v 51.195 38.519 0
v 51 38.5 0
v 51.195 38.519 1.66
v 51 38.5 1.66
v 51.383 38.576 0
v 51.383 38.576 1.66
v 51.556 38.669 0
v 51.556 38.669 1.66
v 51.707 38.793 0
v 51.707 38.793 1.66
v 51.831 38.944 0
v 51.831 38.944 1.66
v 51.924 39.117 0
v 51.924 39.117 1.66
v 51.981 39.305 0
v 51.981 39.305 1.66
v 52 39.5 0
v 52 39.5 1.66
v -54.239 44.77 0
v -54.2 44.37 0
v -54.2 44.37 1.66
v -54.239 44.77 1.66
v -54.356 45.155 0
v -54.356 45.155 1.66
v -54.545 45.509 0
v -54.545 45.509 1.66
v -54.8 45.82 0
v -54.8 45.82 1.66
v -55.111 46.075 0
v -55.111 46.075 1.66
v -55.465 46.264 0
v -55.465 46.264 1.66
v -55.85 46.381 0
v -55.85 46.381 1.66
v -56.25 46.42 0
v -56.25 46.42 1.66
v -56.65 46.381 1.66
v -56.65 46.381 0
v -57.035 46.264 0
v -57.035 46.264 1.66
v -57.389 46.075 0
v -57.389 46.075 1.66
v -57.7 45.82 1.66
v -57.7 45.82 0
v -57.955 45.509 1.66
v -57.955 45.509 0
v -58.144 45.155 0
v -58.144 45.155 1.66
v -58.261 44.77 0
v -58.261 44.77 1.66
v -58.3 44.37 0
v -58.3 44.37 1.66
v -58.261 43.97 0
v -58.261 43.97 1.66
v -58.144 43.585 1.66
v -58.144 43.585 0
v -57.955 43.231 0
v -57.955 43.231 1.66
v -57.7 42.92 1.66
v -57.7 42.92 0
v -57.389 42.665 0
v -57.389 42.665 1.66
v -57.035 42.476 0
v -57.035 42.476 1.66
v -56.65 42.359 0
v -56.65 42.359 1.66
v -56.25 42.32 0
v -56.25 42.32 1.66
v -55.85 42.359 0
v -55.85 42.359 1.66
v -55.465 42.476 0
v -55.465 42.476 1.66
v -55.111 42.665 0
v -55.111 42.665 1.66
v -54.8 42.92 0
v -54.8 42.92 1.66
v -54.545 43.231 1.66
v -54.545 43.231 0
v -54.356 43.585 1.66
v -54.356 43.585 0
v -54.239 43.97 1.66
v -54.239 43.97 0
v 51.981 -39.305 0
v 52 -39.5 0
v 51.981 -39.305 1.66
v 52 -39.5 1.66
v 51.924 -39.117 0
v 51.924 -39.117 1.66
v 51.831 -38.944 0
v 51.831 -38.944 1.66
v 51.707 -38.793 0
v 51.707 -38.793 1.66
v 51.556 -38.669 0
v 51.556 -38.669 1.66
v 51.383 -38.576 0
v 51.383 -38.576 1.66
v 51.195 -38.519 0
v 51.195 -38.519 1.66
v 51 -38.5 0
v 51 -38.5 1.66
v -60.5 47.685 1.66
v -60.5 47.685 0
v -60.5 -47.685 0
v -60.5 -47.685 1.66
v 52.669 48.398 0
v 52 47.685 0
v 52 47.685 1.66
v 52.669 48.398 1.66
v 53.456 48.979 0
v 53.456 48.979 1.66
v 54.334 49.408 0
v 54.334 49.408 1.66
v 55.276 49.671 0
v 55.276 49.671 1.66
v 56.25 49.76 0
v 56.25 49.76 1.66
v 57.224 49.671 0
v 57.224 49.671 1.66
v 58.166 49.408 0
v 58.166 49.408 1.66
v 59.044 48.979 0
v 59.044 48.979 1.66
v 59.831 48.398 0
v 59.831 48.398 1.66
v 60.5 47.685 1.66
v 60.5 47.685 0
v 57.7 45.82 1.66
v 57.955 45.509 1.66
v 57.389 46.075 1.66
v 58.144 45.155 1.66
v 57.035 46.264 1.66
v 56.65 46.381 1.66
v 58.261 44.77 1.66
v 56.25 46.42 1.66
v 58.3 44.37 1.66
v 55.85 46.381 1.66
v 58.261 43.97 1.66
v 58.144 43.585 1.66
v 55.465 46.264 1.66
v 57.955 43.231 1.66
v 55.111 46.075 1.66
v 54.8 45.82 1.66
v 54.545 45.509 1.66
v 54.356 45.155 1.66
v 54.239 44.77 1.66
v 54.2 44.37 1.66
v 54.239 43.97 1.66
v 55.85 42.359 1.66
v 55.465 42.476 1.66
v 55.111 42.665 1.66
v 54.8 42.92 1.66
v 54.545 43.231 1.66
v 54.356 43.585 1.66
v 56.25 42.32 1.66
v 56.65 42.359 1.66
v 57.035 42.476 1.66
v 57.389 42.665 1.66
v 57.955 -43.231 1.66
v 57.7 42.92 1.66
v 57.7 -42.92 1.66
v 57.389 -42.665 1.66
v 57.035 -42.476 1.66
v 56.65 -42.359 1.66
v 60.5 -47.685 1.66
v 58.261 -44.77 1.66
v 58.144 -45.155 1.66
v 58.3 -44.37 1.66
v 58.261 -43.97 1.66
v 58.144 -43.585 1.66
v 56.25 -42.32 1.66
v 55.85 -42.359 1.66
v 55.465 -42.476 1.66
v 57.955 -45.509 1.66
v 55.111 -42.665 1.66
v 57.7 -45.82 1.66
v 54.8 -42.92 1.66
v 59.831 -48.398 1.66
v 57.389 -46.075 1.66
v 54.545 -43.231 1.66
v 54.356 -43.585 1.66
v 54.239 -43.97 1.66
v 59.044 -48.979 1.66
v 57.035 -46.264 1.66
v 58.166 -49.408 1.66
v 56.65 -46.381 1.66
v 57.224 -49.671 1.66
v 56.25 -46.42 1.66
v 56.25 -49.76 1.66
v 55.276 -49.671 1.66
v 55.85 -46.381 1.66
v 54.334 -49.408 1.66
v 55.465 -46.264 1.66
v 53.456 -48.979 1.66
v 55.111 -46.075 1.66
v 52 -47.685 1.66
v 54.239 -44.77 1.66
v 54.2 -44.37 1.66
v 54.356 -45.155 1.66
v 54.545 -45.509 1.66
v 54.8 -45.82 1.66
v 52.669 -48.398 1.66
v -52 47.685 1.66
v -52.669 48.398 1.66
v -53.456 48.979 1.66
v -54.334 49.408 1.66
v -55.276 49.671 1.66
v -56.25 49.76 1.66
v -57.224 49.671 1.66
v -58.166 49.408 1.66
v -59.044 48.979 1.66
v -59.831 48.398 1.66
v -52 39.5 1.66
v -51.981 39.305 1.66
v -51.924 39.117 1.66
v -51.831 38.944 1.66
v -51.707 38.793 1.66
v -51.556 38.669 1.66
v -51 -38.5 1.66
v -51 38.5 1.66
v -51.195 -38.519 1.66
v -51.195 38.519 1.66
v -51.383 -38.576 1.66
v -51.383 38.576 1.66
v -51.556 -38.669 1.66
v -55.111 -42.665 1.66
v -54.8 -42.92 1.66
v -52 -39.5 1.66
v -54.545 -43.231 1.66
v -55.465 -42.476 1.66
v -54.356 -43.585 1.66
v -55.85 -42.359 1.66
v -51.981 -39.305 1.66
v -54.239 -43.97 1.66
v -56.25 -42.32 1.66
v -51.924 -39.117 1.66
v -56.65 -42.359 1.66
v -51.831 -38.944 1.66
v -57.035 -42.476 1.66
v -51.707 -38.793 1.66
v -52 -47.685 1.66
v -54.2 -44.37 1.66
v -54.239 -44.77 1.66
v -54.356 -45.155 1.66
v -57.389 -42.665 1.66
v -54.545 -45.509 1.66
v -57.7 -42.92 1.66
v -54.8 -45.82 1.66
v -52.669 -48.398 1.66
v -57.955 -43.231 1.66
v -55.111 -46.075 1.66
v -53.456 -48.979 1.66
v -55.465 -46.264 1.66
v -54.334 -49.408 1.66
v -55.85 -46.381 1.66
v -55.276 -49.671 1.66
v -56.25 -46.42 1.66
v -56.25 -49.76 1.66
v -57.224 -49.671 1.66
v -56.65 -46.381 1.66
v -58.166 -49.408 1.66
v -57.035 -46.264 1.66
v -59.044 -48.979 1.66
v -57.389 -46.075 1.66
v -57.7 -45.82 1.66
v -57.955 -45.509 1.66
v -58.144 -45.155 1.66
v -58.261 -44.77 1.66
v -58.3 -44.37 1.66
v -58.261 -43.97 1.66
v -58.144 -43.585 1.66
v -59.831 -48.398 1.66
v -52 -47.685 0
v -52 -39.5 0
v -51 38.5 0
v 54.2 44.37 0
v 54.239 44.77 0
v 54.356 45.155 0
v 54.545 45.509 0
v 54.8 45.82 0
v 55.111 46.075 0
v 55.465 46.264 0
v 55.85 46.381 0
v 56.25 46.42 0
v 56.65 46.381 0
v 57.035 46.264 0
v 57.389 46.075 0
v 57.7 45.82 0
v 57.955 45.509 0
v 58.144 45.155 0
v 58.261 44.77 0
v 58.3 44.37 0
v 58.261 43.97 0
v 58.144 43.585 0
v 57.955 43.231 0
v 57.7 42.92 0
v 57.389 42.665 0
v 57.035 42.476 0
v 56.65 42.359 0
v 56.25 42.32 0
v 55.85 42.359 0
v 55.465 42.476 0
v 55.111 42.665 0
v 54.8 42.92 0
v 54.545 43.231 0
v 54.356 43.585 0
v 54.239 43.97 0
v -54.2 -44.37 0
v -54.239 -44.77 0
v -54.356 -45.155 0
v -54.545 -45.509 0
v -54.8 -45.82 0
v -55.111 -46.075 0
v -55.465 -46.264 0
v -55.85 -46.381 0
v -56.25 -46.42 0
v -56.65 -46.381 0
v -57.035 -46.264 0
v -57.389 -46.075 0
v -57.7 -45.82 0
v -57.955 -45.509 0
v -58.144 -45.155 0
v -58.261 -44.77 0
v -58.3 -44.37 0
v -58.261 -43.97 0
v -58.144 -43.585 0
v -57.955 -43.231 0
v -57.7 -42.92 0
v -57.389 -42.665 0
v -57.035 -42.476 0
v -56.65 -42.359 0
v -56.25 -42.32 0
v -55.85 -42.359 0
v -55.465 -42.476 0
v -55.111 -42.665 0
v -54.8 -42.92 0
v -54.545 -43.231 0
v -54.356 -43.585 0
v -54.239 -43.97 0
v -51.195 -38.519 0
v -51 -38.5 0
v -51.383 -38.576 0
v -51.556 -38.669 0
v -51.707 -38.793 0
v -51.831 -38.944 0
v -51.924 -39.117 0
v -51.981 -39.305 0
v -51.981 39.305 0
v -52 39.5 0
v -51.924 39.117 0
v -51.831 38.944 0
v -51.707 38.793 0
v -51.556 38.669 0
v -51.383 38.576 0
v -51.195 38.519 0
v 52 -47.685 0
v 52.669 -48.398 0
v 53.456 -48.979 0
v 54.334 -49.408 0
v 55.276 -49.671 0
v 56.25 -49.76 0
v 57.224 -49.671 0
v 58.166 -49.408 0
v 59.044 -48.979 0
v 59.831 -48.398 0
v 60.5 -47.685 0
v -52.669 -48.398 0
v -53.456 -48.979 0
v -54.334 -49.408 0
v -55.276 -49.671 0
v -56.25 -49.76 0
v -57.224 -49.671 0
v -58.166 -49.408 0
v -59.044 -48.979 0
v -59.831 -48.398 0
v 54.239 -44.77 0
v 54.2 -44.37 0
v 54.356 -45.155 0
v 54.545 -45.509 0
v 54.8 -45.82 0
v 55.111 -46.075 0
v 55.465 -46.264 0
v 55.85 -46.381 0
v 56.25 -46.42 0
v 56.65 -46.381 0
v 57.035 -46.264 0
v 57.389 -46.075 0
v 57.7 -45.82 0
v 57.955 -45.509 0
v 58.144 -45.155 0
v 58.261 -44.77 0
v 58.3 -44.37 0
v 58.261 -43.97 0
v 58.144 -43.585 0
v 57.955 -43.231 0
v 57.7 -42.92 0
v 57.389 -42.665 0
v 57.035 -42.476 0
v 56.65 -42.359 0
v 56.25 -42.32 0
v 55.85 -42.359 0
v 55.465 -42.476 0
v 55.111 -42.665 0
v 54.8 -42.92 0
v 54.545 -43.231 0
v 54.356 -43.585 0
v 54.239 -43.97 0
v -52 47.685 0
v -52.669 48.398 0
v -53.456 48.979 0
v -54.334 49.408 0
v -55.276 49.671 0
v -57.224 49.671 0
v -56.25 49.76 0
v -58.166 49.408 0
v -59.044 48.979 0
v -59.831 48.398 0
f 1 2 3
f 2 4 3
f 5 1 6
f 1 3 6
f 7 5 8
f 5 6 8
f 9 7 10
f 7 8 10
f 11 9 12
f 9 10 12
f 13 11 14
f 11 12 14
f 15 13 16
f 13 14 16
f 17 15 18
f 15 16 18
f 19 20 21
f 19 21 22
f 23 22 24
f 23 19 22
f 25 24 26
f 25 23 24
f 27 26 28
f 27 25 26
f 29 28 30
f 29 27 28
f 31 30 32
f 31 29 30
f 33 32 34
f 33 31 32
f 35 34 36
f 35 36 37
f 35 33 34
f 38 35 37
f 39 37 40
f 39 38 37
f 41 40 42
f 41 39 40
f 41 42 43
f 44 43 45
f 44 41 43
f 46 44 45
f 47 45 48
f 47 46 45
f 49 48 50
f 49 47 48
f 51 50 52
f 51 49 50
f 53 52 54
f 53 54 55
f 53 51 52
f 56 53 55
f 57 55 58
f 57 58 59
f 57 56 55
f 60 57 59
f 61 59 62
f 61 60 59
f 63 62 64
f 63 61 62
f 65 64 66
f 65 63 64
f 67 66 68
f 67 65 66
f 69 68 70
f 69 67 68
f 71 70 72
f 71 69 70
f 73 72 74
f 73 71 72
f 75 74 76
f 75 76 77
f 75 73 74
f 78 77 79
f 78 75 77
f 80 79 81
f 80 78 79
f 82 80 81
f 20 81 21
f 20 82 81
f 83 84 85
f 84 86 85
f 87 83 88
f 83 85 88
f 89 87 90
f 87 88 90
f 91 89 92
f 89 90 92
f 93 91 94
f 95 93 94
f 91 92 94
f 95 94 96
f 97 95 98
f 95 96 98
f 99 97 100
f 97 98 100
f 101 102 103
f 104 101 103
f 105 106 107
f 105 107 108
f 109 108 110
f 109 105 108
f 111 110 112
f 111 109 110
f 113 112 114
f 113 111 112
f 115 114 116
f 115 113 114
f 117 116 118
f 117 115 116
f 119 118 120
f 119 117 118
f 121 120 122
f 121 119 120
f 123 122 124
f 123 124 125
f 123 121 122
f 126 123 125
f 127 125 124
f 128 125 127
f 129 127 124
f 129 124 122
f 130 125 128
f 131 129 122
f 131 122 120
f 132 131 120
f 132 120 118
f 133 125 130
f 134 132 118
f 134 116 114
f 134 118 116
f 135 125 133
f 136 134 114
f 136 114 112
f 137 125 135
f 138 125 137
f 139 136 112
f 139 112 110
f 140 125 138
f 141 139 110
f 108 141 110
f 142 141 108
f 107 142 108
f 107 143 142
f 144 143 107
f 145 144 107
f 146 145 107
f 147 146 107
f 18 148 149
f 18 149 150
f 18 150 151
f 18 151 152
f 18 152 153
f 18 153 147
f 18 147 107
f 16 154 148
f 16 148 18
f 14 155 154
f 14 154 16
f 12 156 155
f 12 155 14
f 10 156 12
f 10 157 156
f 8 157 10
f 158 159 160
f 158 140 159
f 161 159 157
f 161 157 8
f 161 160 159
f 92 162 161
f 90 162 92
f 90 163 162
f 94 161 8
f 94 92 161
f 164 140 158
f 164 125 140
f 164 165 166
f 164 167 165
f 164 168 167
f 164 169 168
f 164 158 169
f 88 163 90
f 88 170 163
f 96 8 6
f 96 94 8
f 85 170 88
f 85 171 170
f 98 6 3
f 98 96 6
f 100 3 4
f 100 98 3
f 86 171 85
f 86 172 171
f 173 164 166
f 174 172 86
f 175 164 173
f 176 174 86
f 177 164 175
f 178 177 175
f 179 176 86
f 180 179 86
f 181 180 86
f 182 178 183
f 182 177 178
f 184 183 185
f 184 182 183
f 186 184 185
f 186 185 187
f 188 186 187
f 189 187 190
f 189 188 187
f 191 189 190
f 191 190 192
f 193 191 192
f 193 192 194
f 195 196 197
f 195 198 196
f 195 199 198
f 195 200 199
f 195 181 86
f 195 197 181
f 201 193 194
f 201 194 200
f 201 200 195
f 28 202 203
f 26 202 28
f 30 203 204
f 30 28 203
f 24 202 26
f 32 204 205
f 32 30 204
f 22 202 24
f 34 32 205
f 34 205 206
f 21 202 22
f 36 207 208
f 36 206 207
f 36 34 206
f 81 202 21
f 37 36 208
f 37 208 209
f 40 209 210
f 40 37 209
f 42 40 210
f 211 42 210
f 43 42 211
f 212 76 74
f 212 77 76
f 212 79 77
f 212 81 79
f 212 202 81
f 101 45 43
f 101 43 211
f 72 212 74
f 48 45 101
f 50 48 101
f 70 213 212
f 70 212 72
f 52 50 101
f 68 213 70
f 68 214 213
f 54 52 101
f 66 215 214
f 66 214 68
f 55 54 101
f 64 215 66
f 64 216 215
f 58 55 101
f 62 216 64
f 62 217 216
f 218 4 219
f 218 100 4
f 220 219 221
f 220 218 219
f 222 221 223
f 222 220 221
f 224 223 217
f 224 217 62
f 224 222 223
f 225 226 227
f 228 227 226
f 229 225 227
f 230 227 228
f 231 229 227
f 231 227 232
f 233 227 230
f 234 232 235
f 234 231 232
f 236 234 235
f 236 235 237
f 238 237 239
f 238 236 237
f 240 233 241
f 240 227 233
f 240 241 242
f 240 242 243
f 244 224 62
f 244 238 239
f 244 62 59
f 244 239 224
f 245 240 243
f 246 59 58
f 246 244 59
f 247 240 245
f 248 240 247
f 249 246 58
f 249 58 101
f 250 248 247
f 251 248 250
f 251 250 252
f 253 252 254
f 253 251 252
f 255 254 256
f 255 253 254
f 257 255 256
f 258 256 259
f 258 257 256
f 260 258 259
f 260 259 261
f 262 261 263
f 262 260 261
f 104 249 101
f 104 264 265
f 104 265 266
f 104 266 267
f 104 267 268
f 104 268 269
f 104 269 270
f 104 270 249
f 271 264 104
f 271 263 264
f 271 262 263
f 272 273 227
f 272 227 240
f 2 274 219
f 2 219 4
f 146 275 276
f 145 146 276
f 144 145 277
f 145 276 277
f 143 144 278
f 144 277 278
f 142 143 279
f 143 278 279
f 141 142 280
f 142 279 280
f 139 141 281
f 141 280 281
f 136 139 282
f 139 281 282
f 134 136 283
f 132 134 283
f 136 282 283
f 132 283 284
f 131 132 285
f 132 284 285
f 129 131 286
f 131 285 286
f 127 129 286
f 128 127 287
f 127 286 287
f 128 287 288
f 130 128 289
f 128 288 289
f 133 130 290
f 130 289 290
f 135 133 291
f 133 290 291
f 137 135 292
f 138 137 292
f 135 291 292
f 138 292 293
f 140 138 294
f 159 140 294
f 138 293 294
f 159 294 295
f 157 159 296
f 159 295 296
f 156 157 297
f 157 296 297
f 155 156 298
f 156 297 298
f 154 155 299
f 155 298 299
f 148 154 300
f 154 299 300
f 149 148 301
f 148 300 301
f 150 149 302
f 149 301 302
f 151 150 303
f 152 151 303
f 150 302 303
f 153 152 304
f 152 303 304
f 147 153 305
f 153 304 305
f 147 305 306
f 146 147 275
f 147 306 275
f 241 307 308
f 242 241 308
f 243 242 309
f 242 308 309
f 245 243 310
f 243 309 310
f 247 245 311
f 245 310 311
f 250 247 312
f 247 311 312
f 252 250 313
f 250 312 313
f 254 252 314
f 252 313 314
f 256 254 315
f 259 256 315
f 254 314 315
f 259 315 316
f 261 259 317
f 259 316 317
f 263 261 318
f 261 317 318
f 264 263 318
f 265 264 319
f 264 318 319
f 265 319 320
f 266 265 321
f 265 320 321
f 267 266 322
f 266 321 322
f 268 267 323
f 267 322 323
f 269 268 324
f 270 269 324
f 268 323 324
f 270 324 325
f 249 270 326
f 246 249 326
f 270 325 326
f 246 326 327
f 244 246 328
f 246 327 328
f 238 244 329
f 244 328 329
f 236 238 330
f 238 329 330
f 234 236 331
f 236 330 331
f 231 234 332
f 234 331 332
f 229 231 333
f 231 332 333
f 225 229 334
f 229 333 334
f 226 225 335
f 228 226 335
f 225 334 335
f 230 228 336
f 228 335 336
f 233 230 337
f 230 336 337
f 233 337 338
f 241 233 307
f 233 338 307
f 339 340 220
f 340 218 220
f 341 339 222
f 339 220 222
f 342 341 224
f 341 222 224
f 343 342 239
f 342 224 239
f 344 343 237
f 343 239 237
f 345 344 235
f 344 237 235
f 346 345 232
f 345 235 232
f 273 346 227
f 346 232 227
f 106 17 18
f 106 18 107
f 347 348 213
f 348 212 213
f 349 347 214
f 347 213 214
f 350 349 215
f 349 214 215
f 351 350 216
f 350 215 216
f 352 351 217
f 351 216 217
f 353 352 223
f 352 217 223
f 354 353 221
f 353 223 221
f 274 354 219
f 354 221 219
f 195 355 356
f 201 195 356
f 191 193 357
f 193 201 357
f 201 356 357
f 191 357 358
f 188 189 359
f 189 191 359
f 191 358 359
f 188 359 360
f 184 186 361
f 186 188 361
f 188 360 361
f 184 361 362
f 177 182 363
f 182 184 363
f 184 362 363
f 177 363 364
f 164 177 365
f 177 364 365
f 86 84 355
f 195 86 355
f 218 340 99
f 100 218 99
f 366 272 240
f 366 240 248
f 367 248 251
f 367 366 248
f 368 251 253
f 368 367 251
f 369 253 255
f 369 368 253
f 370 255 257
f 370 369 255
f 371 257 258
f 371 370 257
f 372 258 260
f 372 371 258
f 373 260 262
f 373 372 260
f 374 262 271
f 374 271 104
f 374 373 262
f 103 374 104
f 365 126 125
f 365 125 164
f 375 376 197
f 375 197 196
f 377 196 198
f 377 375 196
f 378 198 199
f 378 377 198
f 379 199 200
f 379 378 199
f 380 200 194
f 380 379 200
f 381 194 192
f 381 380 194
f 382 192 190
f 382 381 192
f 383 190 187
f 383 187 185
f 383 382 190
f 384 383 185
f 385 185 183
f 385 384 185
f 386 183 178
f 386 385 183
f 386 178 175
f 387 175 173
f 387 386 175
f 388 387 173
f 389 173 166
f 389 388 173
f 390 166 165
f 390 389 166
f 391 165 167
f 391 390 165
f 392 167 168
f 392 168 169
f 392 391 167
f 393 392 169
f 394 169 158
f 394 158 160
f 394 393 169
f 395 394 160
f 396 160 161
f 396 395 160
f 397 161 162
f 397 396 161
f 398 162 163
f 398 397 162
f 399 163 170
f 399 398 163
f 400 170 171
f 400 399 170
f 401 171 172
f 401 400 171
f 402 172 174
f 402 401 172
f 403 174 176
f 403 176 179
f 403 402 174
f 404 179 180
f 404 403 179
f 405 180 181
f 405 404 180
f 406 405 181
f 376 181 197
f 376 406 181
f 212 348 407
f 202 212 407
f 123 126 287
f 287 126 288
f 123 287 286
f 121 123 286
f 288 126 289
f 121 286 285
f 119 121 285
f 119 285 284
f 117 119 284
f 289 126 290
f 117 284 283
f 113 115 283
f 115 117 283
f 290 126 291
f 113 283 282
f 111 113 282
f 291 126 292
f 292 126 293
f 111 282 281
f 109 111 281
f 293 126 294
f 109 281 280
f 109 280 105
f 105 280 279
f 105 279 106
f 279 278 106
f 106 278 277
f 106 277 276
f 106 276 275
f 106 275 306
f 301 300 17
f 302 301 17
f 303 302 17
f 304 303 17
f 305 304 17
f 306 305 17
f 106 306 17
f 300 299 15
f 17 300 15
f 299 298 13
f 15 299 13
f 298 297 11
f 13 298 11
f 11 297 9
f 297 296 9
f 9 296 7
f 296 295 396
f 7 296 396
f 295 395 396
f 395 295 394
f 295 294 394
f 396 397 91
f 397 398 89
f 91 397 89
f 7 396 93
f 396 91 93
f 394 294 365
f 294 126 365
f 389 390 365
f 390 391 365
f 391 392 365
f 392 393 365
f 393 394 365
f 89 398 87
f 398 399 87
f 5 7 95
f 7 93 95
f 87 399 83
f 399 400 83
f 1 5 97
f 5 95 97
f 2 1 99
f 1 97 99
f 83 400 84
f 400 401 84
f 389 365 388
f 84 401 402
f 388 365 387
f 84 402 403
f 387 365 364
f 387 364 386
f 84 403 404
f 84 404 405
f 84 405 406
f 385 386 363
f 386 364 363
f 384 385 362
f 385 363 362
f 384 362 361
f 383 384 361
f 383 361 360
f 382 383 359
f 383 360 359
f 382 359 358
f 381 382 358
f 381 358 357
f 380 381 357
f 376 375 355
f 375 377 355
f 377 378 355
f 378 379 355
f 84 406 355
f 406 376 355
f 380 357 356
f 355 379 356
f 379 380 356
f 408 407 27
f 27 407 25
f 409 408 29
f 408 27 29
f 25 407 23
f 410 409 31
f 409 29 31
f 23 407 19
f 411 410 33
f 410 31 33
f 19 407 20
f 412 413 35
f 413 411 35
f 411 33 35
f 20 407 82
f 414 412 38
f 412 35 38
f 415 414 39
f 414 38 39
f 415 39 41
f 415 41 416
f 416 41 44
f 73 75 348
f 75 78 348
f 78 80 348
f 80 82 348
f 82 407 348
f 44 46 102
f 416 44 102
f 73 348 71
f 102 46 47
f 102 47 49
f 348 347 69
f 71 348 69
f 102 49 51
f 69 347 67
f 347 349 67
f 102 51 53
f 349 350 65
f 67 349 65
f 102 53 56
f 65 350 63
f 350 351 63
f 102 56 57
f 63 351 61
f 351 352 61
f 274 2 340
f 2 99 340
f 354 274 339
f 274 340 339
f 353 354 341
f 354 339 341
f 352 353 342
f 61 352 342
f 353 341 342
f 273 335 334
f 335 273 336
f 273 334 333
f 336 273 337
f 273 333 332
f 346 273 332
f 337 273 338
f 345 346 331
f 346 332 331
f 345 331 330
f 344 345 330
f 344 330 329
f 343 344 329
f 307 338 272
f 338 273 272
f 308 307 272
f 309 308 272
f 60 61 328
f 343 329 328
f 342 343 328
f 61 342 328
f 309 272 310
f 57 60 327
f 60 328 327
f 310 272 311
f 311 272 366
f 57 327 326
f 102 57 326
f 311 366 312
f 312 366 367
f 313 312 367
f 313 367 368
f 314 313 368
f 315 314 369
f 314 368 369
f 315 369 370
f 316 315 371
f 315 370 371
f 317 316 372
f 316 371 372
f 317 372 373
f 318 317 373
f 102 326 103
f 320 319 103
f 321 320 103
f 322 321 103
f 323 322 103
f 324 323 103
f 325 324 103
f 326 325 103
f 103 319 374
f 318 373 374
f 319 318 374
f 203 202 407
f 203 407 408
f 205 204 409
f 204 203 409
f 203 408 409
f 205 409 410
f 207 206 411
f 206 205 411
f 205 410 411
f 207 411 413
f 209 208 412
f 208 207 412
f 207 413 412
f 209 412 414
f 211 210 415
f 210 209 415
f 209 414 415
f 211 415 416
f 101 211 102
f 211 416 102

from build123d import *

# Parameters (mm, degrees)
SKETCH_W                   = 104
SKETCH_H                   = 77
PAD_DEPTH                  = 1.66
SKETCH001_W                = 8.5
SKETCH001_H                = 49.76
PAD001_DEPTH               = 1.66
SKETCH002_R                = 2.05
POCKET_DEPTH               = 1.66
POCKET001_DEPTH            = 5
SKETCH001_MIRRORED_2_W     = 8.5
SKETCH001_MIRRORED_2_H     = 49.76
PAD001_MIRRORED_2_DEPTH    = 1.66
SKETCH002_MIRRORED_2_R     = 2.05
POCKET_MIRRORED_2_DEPTH    = 1.66
POCKET001_MIRRORED_2_DEPTH = 5
FILLET_R                   = 1


with BuildPart() as part:
    # Sketch → Pad (new body)
    with BuildSketch(Plane.XY):
        Rectangle(SKETCH_W, SKETCH_H)
    extrude(amount=PAD_DEPTH)

    # Sketch001 → Pad001 (join)
    with BuildSketch(Plane.XY):
        with Locations((-56.25, 24.88)):
            Rectangle(SKETCH001_W, SKETCH001_H)
    pad001 = extrude(amount=PAD001_DEPTH)

    # Sketch002 → Pocket (cut)
    with BuildSketch(Plane.XY):
        with Locations((-56.25, 44.37)):
            Circle(SKETCH002_R)
    pocket = extrude(amount=POCKET_DEPTH, mode=Mode.SUBTRACT)

    # Sketch003 → Pocket001 (cut)
    with BuildSketch(Plane.XY):
        with BuildLine():
            ThreePointArc((-52, 47.685057), (-56.25, 49.76), (-60.5, 47.685057))
            Line((-60.5, 47.685057), (-60.5, 51.185057))
            Line((-60.5, 51.185057), (-52, 51.185057))
            Line((-52, 51.185057), (-52, 47.685057))
        make_face()
    pocket001 = extrude(amount=POCKET001_DEPTH, mode=Mode.SUBTRACT)

    # Sketch001 Mirrored 2 → Pad001 Mirrored 2 (add)
    with BuildSketch(Plane(origin=(0, 0, 0), x_dir=(-1, 0, 0), z_dir=(0, 0, -1))):
        with Locations((-56.25, 24.88)):
            Rectangle(SKETCH001_MIRRORED_2_W, SKETCH001_MIRRORED_2_H)
    pad001_mirrored_2 = extrude(amount=-PAD001_MIRRORED_2_DEPTH)

    # Sketch002 Mirrored 2 → Pocket Mirrored 2 (cut)
    with BuildSketch(Plane(origin=(0, 0, 0), x_dir=(-1, 0, 0), z_dir=(0, 0, -1))):
        with Locations((-56.25, 44.37)):
            Circle(SKETCH002_MIRRORED_2_R)
    pocket_mirrored_2 = extrude(amount=-POCKET_MIRRORED_2_DEPTH, mode=Mode.SUBTRACT)

    # Sketch003 Mirrored 2 → Pocket001 Mirrored 2 (cut)
    with BuildSketch(Plane(origin=(0, 0, 0), x_dir=(-1, 0, 0), z_dir=(0, 0, -1))):
        with BuildLine():
            ThreePointArc((-52, 47.685057), (-56.25, 49.76), (-60.5, 47.685057))
            Line((-60.5, 47.685057), (-60.5, 51.185057))
            Line((-60.5, 51.185057), (-52, 51.185057))
            Line((-52, 51.185057), (-52, 47.685057))
        make_face()
    pocket001_mirrored_2 = extrude(amount=-POCKET001_MIRRORED_2_DEPTH, mode=Mode.SUBTRACT)

    # Mirrored001: Pad001, Pocket, Pocket001, Pad001 Mirrored 2, Pocket Mirrored 2, Pocket001 Mirrored 2 across XZ
    add(pad001.mirror(Plane.XZ))
    add(pocket.mirror(Plane.XZ), mode=Mode.SUBTRACT)
    add(pocket001.mirror(Plane.XZ), mode=Mode.SUBTRACT)
    add(pad001_mirrored_2.mirror(Plane.XZ))
    add(pocket_mirrored_2.mirror(Plane.XZ), mode=Mode.SUBTRACT)
    add(pocket001_mirrored_2.mirror(Plane.XZ), mode=Mode.SUBTRACT)

    # Fillet
    fillet_edges = [part.edges().sort_by_distance(p)[0] for p in [
        (-52, 38.5, 0.83),
        (52, 38.5, 0.83),
        (-52, -38.5, 0.83),
        (52, -38.5, 0.83),
    ]]
    fillet(fillet_edges, radius=FILLET_R)


solid = part.part
